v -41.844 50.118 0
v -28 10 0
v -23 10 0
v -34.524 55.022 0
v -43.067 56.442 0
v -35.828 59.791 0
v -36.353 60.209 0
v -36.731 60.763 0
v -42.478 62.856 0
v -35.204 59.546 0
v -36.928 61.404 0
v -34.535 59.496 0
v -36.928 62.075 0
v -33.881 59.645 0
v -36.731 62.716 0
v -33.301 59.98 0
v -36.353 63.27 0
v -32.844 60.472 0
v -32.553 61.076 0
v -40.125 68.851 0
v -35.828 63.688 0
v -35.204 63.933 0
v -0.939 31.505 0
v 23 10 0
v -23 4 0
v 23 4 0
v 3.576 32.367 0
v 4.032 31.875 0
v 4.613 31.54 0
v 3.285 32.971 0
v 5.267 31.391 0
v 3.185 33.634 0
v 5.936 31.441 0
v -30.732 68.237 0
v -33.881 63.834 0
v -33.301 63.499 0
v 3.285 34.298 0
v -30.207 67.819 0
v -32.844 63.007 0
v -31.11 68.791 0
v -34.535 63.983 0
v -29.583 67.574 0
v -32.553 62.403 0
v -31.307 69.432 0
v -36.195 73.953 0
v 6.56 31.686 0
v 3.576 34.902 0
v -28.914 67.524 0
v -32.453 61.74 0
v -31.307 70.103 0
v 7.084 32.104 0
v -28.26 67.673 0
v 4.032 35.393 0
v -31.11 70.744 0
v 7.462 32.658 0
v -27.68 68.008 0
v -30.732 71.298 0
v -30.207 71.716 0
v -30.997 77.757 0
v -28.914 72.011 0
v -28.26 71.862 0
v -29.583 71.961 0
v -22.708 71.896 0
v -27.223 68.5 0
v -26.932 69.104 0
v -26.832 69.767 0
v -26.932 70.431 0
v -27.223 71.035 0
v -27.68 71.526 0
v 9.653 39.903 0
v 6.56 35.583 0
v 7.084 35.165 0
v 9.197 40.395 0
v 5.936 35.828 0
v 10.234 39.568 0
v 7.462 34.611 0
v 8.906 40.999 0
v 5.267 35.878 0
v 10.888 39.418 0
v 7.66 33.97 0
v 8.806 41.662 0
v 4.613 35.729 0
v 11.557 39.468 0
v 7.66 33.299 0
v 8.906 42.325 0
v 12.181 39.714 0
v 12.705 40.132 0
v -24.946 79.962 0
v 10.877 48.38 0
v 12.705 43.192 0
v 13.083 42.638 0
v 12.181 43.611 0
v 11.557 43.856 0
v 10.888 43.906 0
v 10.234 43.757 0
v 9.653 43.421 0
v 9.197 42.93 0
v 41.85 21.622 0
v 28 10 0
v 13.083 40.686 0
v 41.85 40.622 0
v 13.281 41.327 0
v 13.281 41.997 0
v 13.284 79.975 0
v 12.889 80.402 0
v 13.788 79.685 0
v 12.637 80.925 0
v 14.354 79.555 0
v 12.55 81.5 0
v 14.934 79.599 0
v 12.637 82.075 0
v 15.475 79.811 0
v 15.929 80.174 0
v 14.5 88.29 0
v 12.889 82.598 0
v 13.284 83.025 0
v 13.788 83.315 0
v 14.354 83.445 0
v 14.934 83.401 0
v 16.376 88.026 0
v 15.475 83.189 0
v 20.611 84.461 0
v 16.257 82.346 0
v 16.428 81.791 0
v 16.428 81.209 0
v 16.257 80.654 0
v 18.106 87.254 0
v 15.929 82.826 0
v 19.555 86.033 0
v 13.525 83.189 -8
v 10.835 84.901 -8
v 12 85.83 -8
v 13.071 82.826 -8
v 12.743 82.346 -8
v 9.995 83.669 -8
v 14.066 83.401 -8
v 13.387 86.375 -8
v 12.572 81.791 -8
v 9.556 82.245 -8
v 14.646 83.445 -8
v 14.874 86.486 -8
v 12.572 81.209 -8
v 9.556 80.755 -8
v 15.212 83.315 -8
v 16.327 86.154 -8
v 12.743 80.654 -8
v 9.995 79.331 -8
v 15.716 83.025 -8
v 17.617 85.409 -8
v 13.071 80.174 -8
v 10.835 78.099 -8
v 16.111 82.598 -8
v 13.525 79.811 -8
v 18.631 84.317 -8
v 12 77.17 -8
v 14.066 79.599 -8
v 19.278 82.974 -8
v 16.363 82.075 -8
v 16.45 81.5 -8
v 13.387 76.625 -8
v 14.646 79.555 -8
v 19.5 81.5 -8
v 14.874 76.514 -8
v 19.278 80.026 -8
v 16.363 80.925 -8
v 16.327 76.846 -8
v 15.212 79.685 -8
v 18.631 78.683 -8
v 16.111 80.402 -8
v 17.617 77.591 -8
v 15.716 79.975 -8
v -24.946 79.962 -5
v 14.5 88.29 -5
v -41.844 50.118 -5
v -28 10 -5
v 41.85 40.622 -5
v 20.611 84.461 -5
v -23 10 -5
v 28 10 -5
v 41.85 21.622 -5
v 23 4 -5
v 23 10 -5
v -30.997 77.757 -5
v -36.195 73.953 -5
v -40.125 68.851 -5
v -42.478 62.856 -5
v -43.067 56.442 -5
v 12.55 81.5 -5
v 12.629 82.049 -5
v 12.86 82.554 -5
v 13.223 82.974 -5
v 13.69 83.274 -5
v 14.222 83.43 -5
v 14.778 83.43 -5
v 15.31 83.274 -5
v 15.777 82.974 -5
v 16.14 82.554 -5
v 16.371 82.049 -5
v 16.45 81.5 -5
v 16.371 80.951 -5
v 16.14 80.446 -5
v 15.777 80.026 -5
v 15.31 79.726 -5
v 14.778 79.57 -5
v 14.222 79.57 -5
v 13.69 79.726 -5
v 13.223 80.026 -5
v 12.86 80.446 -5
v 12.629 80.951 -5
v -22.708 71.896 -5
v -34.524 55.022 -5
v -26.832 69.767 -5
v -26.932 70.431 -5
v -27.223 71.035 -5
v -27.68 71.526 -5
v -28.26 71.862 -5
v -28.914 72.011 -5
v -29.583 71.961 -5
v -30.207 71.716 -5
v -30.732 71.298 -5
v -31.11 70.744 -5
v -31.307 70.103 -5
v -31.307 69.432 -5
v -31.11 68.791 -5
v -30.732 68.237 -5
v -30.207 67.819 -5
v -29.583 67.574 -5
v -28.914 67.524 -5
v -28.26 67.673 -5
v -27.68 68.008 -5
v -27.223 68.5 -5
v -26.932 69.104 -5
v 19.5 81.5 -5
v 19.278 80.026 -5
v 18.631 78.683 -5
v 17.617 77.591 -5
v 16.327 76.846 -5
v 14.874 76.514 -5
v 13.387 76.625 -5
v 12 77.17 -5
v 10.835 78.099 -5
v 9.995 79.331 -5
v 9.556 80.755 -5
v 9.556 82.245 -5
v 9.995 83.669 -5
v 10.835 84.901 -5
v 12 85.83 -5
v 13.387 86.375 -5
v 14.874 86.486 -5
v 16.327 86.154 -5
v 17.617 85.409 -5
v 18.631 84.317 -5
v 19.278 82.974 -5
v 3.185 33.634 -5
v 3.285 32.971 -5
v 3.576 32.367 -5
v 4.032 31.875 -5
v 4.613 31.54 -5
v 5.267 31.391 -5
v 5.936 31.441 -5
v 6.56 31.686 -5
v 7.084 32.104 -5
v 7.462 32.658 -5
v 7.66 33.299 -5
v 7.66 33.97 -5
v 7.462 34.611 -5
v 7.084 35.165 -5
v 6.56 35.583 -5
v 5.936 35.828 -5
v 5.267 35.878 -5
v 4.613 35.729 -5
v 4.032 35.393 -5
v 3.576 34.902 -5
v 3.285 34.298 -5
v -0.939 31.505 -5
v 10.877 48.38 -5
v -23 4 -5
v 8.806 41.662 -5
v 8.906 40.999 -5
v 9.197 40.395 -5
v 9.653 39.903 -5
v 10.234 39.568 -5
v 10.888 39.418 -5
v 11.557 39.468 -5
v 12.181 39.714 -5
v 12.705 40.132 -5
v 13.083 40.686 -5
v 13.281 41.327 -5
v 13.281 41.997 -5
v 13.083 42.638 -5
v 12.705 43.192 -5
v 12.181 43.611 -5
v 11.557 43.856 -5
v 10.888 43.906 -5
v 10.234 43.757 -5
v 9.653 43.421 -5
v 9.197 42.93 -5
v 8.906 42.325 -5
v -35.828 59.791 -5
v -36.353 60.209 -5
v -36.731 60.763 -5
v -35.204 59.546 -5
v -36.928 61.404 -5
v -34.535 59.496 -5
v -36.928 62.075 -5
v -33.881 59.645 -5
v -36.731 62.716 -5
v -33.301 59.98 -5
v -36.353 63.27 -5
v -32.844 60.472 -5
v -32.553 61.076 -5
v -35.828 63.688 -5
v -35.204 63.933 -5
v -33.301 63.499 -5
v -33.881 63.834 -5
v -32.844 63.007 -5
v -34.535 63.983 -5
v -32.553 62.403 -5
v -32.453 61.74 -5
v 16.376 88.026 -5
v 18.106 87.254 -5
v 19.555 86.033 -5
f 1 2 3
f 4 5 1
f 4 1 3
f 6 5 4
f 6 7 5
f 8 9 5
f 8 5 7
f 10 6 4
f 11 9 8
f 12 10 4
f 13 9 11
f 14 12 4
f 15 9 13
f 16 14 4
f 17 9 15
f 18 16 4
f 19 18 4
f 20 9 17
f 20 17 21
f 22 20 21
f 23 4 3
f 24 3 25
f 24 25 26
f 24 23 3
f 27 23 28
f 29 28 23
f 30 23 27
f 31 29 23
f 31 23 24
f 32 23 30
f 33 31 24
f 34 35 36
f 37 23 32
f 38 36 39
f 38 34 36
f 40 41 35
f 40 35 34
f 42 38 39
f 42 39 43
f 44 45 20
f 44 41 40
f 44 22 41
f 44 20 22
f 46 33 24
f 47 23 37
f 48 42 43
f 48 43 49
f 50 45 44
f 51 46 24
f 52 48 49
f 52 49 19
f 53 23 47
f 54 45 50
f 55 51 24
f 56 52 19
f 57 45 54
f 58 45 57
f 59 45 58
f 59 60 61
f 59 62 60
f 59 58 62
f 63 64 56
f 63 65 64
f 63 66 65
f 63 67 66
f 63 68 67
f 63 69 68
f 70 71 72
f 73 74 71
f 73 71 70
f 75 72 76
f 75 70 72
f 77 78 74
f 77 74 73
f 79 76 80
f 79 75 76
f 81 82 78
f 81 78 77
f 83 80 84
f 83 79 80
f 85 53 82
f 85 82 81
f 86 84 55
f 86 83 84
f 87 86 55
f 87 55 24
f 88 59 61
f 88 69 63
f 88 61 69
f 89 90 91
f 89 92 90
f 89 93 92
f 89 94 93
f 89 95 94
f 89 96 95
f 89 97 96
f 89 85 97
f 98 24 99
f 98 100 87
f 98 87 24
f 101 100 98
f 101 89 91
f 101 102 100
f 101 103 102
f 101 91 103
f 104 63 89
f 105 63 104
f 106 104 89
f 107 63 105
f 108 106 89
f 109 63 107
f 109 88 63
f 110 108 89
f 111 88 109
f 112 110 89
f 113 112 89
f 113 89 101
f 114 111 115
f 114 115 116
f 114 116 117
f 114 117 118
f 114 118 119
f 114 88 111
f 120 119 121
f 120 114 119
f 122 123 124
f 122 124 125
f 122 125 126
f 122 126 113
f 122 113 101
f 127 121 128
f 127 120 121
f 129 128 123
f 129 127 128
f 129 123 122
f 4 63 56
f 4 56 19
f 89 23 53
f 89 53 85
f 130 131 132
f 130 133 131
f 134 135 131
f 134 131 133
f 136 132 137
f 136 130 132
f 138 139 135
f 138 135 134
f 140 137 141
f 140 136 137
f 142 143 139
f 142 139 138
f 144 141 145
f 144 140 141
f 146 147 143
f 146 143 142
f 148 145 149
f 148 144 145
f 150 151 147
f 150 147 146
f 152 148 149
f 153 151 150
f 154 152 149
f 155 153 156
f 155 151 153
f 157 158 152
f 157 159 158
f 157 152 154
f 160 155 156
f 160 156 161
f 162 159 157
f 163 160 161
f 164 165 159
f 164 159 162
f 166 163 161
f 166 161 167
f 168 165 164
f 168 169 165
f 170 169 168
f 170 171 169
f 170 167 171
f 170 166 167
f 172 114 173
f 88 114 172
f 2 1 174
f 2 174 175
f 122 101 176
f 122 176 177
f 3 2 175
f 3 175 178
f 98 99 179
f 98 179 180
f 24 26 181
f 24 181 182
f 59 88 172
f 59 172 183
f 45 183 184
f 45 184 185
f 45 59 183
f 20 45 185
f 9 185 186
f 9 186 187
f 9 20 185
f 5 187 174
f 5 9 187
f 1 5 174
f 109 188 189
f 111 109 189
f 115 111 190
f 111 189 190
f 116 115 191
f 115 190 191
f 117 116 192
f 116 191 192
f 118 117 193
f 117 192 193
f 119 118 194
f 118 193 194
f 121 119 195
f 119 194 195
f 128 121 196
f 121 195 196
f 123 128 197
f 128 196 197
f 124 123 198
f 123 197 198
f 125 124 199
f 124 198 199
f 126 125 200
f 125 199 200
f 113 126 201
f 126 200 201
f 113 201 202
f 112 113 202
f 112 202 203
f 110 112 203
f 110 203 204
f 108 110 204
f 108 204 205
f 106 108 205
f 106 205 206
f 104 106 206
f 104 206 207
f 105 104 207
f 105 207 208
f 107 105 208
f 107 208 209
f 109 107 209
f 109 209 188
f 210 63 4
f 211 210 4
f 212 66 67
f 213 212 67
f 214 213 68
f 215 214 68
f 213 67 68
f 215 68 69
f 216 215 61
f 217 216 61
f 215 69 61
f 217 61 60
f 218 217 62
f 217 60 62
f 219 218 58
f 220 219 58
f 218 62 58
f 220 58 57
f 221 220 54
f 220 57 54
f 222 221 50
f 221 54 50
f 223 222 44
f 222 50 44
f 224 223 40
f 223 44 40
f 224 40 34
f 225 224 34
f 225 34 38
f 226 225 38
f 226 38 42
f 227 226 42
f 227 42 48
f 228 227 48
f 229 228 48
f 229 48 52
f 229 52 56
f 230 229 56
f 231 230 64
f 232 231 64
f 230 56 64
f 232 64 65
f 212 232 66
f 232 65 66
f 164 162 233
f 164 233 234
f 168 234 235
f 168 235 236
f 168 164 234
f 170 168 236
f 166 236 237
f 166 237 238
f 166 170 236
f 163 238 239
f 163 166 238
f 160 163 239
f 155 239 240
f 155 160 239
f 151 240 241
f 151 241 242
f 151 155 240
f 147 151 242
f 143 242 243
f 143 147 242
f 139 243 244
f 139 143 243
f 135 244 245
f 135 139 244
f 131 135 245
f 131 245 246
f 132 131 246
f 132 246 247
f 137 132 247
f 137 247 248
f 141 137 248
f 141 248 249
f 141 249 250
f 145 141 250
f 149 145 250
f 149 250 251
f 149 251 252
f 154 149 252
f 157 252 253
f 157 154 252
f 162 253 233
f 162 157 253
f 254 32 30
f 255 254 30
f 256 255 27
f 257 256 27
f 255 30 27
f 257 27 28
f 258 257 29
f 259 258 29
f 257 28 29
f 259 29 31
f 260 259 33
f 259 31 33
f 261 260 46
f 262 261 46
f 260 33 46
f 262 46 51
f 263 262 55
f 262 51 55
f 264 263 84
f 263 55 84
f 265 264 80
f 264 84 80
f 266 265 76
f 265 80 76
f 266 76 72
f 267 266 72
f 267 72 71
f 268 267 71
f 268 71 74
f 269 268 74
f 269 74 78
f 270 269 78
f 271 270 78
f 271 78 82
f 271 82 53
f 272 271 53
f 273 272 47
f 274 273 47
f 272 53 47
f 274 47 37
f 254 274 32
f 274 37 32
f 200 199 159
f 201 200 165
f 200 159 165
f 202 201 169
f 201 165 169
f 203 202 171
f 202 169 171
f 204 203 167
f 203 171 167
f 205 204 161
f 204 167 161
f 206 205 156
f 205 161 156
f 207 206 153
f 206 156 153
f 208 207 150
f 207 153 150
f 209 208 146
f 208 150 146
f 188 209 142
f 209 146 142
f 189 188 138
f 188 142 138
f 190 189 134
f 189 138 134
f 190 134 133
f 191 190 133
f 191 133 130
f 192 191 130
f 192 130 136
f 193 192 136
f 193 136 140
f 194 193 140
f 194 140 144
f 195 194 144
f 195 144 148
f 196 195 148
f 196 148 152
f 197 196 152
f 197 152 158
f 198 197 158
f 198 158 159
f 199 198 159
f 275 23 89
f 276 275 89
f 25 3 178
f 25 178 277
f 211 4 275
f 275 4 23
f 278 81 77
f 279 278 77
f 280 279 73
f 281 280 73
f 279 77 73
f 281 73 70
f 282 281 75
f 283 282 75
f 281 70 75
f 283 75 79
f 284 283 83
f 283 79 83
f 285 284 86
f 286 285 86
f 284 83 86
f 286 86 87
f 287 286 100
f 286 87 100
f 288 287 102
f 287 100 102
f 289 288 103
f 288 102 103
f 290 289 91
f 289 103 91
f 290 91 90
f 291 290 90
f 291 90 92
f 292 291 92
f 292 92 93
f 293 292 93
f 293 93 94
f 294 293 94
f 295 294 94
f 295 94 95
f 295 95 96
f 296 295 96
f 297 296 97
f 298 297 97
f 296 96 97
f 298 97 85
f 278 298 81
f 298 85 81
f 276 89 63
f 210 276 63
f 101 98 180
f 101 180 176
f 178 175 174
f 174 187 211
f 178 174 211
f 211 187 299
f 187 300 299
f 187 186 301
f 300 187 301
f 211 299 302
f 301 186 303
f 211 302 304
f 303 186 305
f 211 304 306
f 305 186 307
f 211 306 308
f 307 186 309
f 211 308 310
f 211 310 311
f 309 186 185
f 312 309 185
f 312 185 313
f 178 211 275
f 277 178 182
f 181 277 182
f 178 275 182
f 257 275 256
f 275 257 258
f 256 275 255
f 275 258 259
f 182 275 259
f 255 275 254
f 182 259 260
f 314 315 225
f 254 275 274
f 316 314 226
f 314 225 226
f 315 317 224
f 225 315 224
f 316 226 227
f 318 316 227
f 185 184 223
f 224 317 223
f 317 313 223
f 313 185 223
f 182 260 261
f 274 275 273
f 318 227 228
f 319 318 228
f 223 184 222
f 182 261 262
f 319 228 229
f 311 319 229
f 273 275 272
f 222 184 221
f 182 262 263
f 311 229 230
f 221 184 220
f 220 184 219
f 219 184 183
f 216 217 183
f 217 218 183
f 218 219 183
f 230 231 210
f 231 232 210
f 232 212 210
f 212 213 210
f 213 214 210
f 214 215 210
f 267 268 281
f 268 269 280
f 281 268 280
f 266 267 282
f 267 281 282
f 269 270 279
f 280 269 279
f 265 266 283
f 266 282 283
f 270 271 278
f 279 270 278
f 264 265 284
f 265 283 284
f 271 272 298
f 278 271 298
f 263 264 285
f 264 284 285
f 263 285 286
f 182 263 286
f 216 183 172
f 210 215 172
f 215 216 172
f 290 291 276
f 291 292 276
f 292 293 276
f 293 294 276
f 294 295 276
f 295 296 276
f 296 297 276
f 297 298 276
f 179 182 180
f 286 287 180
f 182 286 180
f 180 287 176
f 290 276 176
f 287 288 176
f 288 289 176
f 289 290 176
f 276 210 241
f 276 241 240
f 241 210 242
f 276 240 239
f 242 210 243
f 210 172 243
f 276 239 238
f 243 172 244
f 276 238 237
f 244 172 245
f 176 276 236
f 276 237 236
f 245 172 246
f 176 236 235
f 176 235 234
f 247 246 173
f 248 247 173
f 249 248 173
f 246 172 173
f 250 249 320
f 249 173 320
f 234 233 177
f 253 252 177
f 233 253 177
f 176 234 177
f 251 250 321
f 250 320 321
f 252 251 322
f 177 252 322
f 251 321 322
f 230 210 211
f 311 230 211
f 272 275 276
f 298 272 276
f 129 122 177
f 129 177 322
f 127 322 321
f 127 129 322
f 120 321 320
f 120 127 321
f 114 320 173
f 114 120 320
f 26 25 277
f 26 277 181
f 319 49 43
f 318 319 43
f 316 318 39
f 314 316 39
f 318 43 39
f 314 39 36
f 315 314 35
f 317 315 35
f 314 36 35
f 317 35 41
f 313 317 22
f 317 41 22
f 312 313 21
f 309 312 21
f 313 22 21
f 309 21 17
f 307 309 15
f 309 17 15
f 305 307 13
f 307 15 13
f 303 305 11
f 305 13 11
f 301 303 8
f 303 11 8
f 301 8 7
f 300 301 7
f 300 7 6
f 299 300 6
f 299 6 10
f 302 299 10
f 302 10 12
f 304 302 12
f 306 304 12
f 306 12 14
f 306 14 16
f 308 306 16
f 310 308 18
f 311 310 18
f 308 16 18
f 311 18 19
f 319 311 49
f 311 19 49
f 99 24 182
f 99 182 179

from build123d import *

# Parameters (mm, degrees)
SKETCH1_R                  = 2.25
BOSS_EXTRUDE1_DEPTH        = 5
M3_5_CLEARANCE_HOLE1_D     = 3.9
M3_5_CLEARANCE_HOLE1_DEPTH = 10
M3_5_CLEARANCE_HOLE1_TIP   = 1.171678207
EXTRUDE_START              = 3
SKETCH_2_R                 = 5
SKETCH_2_R_2               = 1.95
EXTRUDE_2_DEPTH            = 3


with BuildPart() as part:
    # Sketch1 → Boss-Extrude1 (new body)
    with BuildSketch(Plane.XY):
        with BuildLine():
            Line((41.849999868, 40.621529794), (20.610605728, 84.460506241))
            ThreePointArc((20.610605728, 84.460506241), (18.105708126, 87.253517924), (14.499999983, 88.289999977))
            Line((14.499999983, 88.289999977), (-24.945583467, 79.961565754))
            ThreePointArc((-24.945583467, 79.961565754), (-40.125494586, 68.851065128), (-41.843761596, 50.118193373))
            Line((-41.843761596, 50.118193373), (-27.999999977, 9.999999991))
            Line((-27.999999977, 9.999999991), (-22.999999995, 9.999999991))
            Line((-22.999999995, 9.999999991), (-22.999999995, 3.999999991))
            Line((-22.999999995, 3.999999991), (22.999999995, 3.999999991))
            Line((22.999999995, 3.999999991), (22.999999995, 9.999999991))
            Line((22.999999995, 9.999999991), (27.999999977, 9.999999991))
            Line((27.999999977, 9.999999991), (41.849999868, 21.621529803))
            Line((41.849999868, 21.621529803), (41.849999868, 40.621529794))
        make_face()
        with Locations((-29.082392063, 69.767309235)):
            Circle(SKETCH1_R, mode=Mode.SUBTRACT)
        with Locations((-34.70344114, 61.739619201)):
            Circle(SKETCH1_R, mode=Mode.SUBTRACT)
        with Locations(Location((5.43500903, 33.63437382, 0), (0, 0, 180))):
            Circle(SKETCH1_R, mode=Mode.SUBTRACT)
        with Locations(Location((11.056058107, 41.662063854, 0), (0, 0, 180))):
            Circle(SKETCH1_R, mode=Mode.SUBTRACT)
        Polygon((-22.70847113, 71.896424529), (-34.524145719, 55.021892416), (-0.938911903, 31.505258526), (10.876762686, 48.379790638), align=None, mode=Mode.SUBTRACT)
    extrude(amount=-BOSS_EXTRUDE1_DEPTH)

    # M3.5 Clearance Hole1
    with Locations(Plane.XY):
        with Locations((14.499999983, 81.499999989)):
            Hole(M3_5_CLEARANCE_HOLE1_D / 2, depth=M3_5_CLEARANCE_HOLE1_DEPTH)
            with Locations((0, 0, -(M3_5_CLEARANCE_HOLE1_DEPTH + M3_5_CLEARANCE_HOLE1_TIP / 2))):  # 118° drill point
                Cone(0, M3_5_CLEARANCE_HOLE1_D / 2, M3_5_CLEARANCE_HOLE1_TIP, mode=Mode.SUBTRACT)

    # 草图2 → 凸台-拉伸2 (add)
    with BuildSketch(Plane(origin=(0, 0, -5), x_dir=(-1, 0, 0), z_dir=(0, 0, -1)).offset(EXTRUDE_START)):
        with Locations(Location((-14.499999983, 81.499999989, 0), (0, 0, 180))):
            Circle(SKETCH_2_R)
        with Locations(Location((-14.499999983, 81.499999989, 0), (0, 0, 180))):
            Circle(SKETCH_2_R_2, mode=Mode.SUBTRACT)
    extrude(amount=-EXTRUDE_2_DEPTH)


solid = part.part
